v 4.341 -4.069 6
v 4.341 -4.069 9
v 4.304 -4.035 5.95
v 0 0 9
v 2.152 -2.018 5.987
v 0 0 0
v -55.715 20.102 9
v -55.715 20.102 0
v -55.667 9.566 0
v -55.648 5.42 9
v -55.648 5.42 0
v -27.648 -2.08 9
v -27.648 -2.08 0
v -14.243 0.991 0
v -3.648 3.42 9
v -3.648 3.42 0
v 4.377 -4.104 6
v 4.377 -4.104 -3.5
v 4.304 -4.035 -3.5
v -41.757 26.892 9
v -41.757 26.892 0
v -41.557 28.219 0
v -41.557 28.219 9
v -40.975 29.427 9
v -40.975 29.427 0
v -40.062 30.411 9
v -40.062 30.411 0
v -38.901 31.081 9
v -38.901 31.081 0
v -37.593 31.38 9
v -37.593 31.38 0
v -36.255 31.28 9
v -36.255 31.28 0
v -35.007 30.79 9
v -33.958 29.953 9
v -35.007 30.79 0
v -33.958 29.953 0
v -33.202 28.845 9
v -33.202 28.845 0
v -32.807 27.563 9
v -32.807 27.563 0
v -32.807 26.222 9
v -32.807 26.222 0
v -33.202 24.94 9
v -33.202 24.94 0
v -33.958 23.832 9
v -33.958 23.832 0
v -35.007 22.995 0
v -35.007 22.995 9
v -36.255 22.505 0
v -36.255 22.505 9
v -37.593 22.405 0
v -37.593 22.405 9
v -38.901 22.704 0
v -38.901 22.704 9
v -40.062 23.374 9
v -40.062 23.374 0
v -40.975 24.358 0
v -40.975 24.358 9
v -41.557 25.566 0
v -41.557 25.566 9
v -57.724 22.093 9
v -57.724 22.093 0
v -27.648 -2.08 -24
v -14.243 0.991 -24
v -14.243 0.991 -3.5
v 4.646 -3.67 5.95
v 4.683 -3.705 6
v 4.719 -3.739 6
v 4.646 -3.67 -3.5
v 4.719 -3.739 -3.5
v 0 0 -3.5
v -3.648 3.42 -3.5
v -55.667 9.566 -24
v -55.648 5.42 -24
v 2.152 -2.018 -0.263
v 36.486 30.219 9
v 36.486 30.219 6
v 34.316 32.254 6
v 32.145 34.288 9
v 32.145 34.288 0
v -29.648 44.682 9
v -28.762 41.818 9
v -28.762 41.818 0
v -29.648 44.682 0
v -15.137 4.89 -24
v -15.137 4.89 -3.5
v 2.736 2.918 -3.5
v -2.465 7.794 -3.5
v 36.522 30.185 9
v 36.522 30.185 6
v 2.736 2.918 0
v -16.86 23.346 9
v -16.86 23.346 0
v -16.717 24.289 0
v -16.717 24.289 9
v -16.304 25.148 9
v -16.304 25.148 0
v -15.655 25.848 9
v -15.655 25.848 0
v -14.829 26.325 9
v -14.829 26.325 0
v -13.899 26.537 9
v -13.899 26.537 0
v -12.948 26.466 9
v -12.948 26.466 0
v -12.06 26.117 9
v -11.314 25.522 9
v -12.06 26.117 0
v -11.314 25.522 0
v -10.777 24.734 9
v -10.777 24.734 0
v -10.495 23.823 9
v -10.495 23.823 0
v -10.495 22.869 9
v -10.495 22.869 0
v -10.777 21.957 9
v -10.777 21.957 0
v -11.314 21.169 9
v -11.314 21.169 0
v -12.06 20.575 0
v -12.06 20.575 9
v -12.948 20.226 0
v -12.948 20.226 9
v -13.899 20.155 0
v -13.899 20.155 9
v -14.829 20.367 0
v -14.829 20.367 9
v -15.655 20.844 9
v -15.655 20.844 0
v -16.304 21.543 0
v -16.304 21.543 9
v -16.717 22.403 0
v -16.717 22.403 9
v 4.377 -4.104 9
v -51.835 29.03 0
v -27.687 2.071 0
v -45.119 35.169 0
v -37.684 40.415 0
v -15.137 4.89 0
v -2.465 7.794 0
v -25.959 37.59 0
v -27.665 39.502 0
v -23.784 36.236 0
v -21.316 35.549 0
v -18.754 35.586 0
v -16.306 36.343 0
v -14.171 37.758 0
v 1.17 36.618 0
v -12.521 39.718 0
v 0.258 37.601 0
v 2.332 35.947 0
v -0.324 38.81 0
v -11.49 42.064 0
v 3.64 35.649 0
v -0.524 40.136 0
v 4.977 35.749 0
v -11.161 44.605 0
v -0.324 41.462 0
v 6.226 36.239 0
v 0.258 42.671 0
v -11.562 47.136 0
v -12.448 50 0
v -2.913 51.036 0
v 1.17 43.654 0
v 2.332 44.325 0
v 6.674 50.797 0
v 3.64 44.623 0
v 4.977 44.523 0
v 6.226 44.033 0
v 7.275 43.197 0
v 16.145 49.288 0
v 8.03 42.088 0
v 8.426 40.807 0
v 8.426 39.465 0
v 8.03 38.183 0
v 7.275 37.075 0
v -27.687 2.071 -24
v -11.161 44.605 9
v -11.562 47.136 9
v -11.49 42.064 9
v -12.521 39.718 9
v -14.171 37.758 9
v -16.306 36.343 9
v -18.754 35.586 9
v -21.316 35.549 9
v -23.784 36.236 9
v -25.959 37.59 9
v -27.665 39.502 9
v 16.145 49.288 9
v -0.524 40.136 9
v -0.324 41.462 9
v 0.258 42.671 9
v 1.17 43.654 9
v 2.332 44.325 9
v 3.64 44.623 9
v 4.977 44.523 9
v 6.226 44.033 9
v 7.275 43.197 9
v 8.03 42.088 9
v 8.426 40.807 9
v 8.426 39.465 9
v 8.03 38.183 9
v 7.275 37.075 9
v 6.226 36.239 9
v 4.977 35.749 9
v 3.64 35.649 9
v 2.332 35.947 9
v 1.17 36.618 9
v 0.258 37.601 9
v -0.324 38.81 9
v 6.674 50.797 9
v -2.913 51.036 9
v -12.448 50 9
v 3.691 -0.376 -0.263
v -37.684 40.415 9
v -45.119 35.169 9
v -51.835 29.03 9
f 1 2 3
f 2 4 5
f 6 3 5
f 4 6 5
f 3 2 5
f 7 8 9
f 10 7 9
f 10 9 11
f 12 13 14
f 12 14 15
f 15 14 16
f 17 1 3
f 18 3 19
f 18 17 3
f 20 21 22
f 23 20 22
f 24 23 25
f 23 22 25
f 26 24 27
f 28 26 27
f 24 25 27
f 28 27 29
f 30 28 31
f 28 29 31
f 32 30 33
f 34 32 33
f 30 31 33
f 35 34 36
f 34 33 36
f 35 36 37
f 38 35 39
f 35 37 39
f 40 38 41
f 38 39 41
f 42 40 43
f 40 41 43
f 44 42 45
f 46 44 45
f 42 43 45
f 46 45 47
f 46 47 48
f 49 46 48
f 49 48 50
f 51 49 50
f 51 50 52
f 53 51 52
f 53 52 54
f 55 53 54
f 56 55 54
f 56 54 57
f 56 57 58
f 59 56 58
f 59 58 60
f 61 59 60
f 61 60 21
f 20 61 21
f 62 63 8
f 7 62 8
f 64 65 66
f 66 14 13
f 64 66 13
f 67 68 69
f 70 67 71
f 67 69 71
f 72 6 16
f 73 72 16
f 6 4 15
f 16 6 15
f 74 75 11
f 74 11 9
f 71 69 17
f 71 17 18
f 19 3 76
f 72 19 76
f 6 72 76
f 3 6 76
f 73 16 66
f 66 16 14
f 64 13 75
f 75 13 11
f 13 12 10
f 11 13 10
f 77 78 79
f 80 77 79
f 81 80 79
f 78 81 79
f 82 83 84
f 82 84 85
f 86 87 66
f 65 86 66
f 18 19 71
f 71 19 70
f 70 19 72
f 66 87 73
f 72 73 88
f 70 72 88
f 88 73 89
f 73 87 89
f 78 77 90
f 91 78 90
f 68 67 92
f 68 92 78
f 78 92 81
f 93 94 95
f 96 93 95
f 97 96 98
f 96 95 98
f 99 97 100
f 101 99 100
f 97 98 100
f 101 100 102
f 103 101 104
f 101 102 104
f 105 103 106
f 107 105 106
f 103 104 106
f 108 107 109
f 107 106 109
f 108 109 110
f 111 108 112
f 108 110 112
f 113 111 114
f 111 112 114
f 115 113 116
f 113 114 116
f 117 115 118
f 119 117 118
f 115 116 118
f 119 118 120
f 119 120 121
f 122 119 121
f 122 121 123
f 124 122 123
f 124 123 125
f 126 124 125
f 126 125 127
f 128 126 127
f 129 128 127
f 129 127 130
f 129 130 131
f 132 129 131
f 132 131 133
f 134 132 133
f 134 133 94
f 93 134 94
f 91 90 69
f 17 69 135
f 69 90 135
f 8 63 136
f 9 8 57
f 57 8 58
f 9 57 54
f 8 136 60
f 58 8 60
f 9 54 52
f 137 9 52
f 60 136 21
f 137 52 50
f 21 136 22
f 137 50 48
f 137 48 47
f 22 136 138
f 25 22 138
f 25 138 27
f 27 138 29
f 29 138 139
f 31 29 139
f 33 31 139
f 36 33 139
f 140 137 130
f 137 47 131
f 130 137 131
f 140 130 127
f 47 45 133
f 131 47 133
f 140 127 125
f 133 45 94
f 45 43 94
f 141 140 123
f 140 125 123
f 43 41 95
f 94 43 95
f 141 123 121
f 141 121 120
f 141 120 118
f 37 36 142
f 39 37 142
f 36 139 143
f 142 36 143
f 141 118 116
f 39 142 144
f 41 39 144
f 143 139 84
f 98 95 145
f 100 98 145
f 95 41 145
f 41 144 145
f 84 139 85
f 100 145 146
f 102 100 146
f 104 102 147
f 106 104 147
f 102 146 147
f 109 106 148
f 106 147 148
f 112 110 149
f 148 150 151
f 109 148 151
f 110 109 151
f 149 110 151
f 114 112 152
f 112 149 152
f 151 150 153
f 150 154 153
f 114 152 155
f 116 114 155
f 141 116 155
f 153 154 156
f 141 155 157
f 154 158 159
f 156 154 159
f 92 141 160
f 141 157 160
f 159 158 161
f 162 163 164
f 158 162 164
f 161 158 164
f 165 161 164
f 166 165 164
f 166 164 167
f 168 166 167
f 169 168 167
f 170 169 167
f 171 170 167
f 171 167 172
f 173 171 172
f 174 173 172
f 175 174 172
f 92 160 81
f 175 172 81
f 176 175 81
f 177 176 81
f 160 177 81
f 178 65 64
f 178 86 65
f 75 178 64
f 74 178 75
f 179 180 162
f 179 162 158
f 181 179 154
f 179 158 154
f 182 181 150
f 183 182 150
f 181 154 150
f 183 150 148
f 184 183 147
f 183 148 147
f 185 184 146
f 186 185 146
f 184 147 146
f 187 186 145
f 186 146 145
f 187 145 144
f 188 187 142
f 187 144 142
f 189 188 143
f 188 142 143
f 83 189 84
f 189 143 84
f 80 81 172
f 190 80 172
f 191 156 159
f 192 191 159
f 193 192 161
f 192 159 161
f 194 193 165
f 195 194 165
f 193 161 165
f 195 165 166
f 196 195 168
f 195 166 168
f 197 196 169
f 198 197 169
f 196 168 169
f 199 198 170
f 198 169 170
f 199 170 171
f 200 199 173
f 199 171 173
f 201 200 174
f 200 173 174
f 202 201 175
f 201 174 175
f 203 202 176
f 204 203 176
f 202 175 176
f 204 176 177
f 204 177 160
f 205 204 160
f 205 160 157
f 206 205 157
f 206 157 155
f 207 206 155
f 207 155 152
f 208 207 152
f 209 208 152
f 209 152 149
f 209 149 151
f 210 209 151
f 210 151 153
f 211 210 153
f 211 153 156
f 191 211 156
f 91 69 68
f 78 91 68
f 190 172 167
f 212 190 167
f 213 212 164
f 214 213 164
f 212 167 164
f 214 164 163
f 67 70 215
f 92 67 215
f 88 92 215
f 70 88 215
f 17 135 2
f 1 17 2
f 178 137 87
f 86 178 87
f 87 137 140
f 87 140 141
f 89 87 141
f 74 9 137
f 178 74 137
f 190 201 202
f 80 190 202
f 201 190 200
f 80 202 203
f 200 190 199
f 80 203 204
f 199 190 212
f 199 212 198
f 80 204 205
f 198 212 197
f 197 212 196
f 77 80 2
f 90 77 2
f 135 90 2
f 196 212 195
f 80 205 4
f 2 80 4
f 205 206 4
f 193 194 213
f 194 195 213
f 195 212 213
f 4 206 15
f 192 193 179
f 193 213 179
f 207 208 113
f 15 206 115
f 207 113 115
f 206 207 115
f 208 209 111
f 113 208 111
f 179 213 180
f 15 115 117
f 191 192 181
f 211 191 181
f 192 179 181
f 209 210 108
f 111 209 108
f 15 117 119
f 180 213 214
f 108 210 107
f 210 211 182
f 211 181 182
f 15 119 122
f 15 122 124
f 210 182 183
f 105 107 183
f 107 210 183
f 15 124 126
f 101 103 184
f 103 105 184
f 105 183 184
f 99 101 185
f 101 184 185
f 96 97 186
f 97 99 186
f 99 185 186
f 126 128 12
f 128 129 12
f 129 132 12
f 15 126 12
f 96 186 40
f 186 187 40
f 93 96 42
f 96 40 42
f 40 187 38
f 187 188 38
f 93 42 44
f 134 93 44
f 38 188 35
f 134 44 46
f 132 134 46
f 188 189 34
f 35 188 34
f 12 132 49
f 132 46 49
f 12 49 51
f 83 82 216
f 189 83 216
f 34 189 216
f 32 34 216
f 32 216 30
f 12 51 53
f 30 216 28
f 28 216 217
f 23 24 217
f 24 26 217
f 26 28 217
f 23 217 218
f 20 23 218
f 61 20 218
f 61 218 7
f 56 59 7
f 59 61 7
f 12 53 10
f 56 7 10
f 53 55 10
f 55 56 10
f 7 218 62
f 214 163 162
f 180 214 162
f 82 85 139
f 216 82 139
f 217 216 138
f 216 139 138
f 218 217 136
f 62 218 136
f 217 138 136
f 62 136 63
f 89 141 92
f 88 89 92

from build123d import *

# Parameters (mm, degrees)
ESTRUSIONE_ESTRUSIONE1_DEPTH = 9
ESTRUSIONE_SOTTILE1_DEPTH    = 3
ESTRUSIONE_ESTRUSIONE2_DEPTH = 3.5
SCHIZZO4_W                   = 9.5
SCHIZZO4_H                   = 0.5
ESTRUSIONE_ESTRUSIONE3_DEPTH = 0.1
ESTRUSIONE_ESTRUSIONE4_DEPTH = 24
SCHIZZO6_R                   = 4.5
SCHIZZO6_R_2                 = 3.2
TAGLIO_ESTRUSIONE1_DEPTH     = 81.740882068


with BuildPart() as part:
    # Schizzo1 → Estrusione-Estrusione1 (new body)
    with BuildSketch(Plane.XY):
        with BuildLine():
            Line((-3.647686021, 3.419705644), (0, 0))
            Line((0, 0), (32.145233057, 34.288248595))
            Line((32.145233057, 34.288248595), (16.145233057, 49.288248595))
            ThreePointArc((16.145233057, 49.288248595), (1.884416467, 51.07583724), (-12.447686021, 50.000104337))
            Line((-12.447686021, 50.000104337), (-11.562006013, 47.13559635))
            ThreePointArc((-11.562006013, 47.13559635), (-17.502963658, 35.876553995), (-28.762006013, 41.81751164))
            Line((-28.762006013, 41.81751164), (-29.647686021, 44.682019626))
            ThreePointArc((-29.647686021, 44.682019626), (-45.119453561, 35.169318817), (-57.724052903, 22.09296065))
            Line((-57.724052903, 22.09296065), (-55.714897525, 20.102116027))
            Line((-55.714897525, 20.102116027), (-55.647686021, 5.419705644))
            Line((-55.647686021, 5.419705644), (-27.647686021, -2.080294356))
            Line((-27.647686021, -2.080294356), (-3.647686021, 3.419705644))
        make_face()
    extrude(amount=ESTRUSIONE_ESTRUSIONE1_DEPTH)


with BuildPart() as body_2:
    # Schizzo2 → Estrusione-Sottile1 (new body)
    with BuildSketch(Plane.XY.offset(9)):
        Polygon((36.522456282, 30.184601821), (4.377223225, -4.103646773), (4.340746365, -4.069449717), (36.485979422, 30.218798878), align=None)
    extrude(amount=-ESTRUSIONE_SOTTILE1_DEPTH)


    add(part.part)  # loft1 joins it to this body
    # loft from a face of the part (loft1)
    loft([body_2.faces().sort_by_distance((20.413362893, 13.07467458, 7.5))[0], body_2.faces().sort_by_distance((16.072616529, 17.144124297, 4.5))[0]])

    # Schizzo3 → Estrusione-Estrusione2 (add)
    with BuildSketch(Plane(origin=(0, 0, 0), x_dir=(-1, 0, 0), z_dir=(0, 0, -1))):
        Polygon((0, 0), (3.647686021, 3.419705644), (14.243498137, 0.991498701), (15.137002762, 4.890427975), (2.465482621, 7.794318007), (-2.735764516, 2.918148817), align=None)
    extrude(amount=ESTRUSIONE_ESTRUSIONE2_DEPTH)

    # Schizzo4 → Estrusione-Estrusione3 (add)
    with BuildSketch(Plane(origin=(4.377223225, -4.103646773, 0), x_dir=(0, 0, -1), z_dir=(0.7295372041400824, -0.6839411288813327, 0))):
        with Locations((-1.25, 0.25)):
            Rectangle(SCHIZZO4_W, SCHIZZO4_H)
    extrude(amount=-ESTRUSIONE_ESTRUSIONE3_DEPTH)

    # loft from a face of the part (loft3)
    loft([body_2.faces().sort_by_distance((4.475254787, -3.852868359, 1.224789916))[0], body_2.faces().sort_by_distance((1.367882258, 1.459074408, -1.75))[0]])

    # Schizzo5 → Estrusione-Estrusione4 (add)
    with BuildSketch(Plane(origin=(0, 0, 0), x_dir=(-1, 0, 0), z_dir=(0, 0, -1))):
        Polygon((14.243498137, 0.991498701), (27.647686021, -2.080294356), (55.647686021, 5.419705644), (55.666665545, 9.565798886), (27.686647069, 2.07115108), (15.137002762, 4.890427975), align=None)
    extrude(amount=ESTRUSIONE_ESTRUSIONE4_DEPTH)

    # Schizzo6 → Taglio-Estrusione1 (cut, through all)
    with BuildSketch(Plane(origin=(0, 0, 0), x_dir=(-1, 0, 0), z_dir=(0, 0, -1))):
        with Locations((-3.975977763, 40.135945247)):
            Circle(SCHIZZO6_R)
        with Locations((13.659623442, 23.345827018)):
            Circle(SCHIZZO6_R_2)
        with Locations((37.256730628, 26.89249206)):
            Circle(SCHIZZO6_R)
    extrude(amount=-TAGLIO_ESTRUSIONE1_DEPTH, mode=Mode.SUBTRACT)


solid = body_2.part
